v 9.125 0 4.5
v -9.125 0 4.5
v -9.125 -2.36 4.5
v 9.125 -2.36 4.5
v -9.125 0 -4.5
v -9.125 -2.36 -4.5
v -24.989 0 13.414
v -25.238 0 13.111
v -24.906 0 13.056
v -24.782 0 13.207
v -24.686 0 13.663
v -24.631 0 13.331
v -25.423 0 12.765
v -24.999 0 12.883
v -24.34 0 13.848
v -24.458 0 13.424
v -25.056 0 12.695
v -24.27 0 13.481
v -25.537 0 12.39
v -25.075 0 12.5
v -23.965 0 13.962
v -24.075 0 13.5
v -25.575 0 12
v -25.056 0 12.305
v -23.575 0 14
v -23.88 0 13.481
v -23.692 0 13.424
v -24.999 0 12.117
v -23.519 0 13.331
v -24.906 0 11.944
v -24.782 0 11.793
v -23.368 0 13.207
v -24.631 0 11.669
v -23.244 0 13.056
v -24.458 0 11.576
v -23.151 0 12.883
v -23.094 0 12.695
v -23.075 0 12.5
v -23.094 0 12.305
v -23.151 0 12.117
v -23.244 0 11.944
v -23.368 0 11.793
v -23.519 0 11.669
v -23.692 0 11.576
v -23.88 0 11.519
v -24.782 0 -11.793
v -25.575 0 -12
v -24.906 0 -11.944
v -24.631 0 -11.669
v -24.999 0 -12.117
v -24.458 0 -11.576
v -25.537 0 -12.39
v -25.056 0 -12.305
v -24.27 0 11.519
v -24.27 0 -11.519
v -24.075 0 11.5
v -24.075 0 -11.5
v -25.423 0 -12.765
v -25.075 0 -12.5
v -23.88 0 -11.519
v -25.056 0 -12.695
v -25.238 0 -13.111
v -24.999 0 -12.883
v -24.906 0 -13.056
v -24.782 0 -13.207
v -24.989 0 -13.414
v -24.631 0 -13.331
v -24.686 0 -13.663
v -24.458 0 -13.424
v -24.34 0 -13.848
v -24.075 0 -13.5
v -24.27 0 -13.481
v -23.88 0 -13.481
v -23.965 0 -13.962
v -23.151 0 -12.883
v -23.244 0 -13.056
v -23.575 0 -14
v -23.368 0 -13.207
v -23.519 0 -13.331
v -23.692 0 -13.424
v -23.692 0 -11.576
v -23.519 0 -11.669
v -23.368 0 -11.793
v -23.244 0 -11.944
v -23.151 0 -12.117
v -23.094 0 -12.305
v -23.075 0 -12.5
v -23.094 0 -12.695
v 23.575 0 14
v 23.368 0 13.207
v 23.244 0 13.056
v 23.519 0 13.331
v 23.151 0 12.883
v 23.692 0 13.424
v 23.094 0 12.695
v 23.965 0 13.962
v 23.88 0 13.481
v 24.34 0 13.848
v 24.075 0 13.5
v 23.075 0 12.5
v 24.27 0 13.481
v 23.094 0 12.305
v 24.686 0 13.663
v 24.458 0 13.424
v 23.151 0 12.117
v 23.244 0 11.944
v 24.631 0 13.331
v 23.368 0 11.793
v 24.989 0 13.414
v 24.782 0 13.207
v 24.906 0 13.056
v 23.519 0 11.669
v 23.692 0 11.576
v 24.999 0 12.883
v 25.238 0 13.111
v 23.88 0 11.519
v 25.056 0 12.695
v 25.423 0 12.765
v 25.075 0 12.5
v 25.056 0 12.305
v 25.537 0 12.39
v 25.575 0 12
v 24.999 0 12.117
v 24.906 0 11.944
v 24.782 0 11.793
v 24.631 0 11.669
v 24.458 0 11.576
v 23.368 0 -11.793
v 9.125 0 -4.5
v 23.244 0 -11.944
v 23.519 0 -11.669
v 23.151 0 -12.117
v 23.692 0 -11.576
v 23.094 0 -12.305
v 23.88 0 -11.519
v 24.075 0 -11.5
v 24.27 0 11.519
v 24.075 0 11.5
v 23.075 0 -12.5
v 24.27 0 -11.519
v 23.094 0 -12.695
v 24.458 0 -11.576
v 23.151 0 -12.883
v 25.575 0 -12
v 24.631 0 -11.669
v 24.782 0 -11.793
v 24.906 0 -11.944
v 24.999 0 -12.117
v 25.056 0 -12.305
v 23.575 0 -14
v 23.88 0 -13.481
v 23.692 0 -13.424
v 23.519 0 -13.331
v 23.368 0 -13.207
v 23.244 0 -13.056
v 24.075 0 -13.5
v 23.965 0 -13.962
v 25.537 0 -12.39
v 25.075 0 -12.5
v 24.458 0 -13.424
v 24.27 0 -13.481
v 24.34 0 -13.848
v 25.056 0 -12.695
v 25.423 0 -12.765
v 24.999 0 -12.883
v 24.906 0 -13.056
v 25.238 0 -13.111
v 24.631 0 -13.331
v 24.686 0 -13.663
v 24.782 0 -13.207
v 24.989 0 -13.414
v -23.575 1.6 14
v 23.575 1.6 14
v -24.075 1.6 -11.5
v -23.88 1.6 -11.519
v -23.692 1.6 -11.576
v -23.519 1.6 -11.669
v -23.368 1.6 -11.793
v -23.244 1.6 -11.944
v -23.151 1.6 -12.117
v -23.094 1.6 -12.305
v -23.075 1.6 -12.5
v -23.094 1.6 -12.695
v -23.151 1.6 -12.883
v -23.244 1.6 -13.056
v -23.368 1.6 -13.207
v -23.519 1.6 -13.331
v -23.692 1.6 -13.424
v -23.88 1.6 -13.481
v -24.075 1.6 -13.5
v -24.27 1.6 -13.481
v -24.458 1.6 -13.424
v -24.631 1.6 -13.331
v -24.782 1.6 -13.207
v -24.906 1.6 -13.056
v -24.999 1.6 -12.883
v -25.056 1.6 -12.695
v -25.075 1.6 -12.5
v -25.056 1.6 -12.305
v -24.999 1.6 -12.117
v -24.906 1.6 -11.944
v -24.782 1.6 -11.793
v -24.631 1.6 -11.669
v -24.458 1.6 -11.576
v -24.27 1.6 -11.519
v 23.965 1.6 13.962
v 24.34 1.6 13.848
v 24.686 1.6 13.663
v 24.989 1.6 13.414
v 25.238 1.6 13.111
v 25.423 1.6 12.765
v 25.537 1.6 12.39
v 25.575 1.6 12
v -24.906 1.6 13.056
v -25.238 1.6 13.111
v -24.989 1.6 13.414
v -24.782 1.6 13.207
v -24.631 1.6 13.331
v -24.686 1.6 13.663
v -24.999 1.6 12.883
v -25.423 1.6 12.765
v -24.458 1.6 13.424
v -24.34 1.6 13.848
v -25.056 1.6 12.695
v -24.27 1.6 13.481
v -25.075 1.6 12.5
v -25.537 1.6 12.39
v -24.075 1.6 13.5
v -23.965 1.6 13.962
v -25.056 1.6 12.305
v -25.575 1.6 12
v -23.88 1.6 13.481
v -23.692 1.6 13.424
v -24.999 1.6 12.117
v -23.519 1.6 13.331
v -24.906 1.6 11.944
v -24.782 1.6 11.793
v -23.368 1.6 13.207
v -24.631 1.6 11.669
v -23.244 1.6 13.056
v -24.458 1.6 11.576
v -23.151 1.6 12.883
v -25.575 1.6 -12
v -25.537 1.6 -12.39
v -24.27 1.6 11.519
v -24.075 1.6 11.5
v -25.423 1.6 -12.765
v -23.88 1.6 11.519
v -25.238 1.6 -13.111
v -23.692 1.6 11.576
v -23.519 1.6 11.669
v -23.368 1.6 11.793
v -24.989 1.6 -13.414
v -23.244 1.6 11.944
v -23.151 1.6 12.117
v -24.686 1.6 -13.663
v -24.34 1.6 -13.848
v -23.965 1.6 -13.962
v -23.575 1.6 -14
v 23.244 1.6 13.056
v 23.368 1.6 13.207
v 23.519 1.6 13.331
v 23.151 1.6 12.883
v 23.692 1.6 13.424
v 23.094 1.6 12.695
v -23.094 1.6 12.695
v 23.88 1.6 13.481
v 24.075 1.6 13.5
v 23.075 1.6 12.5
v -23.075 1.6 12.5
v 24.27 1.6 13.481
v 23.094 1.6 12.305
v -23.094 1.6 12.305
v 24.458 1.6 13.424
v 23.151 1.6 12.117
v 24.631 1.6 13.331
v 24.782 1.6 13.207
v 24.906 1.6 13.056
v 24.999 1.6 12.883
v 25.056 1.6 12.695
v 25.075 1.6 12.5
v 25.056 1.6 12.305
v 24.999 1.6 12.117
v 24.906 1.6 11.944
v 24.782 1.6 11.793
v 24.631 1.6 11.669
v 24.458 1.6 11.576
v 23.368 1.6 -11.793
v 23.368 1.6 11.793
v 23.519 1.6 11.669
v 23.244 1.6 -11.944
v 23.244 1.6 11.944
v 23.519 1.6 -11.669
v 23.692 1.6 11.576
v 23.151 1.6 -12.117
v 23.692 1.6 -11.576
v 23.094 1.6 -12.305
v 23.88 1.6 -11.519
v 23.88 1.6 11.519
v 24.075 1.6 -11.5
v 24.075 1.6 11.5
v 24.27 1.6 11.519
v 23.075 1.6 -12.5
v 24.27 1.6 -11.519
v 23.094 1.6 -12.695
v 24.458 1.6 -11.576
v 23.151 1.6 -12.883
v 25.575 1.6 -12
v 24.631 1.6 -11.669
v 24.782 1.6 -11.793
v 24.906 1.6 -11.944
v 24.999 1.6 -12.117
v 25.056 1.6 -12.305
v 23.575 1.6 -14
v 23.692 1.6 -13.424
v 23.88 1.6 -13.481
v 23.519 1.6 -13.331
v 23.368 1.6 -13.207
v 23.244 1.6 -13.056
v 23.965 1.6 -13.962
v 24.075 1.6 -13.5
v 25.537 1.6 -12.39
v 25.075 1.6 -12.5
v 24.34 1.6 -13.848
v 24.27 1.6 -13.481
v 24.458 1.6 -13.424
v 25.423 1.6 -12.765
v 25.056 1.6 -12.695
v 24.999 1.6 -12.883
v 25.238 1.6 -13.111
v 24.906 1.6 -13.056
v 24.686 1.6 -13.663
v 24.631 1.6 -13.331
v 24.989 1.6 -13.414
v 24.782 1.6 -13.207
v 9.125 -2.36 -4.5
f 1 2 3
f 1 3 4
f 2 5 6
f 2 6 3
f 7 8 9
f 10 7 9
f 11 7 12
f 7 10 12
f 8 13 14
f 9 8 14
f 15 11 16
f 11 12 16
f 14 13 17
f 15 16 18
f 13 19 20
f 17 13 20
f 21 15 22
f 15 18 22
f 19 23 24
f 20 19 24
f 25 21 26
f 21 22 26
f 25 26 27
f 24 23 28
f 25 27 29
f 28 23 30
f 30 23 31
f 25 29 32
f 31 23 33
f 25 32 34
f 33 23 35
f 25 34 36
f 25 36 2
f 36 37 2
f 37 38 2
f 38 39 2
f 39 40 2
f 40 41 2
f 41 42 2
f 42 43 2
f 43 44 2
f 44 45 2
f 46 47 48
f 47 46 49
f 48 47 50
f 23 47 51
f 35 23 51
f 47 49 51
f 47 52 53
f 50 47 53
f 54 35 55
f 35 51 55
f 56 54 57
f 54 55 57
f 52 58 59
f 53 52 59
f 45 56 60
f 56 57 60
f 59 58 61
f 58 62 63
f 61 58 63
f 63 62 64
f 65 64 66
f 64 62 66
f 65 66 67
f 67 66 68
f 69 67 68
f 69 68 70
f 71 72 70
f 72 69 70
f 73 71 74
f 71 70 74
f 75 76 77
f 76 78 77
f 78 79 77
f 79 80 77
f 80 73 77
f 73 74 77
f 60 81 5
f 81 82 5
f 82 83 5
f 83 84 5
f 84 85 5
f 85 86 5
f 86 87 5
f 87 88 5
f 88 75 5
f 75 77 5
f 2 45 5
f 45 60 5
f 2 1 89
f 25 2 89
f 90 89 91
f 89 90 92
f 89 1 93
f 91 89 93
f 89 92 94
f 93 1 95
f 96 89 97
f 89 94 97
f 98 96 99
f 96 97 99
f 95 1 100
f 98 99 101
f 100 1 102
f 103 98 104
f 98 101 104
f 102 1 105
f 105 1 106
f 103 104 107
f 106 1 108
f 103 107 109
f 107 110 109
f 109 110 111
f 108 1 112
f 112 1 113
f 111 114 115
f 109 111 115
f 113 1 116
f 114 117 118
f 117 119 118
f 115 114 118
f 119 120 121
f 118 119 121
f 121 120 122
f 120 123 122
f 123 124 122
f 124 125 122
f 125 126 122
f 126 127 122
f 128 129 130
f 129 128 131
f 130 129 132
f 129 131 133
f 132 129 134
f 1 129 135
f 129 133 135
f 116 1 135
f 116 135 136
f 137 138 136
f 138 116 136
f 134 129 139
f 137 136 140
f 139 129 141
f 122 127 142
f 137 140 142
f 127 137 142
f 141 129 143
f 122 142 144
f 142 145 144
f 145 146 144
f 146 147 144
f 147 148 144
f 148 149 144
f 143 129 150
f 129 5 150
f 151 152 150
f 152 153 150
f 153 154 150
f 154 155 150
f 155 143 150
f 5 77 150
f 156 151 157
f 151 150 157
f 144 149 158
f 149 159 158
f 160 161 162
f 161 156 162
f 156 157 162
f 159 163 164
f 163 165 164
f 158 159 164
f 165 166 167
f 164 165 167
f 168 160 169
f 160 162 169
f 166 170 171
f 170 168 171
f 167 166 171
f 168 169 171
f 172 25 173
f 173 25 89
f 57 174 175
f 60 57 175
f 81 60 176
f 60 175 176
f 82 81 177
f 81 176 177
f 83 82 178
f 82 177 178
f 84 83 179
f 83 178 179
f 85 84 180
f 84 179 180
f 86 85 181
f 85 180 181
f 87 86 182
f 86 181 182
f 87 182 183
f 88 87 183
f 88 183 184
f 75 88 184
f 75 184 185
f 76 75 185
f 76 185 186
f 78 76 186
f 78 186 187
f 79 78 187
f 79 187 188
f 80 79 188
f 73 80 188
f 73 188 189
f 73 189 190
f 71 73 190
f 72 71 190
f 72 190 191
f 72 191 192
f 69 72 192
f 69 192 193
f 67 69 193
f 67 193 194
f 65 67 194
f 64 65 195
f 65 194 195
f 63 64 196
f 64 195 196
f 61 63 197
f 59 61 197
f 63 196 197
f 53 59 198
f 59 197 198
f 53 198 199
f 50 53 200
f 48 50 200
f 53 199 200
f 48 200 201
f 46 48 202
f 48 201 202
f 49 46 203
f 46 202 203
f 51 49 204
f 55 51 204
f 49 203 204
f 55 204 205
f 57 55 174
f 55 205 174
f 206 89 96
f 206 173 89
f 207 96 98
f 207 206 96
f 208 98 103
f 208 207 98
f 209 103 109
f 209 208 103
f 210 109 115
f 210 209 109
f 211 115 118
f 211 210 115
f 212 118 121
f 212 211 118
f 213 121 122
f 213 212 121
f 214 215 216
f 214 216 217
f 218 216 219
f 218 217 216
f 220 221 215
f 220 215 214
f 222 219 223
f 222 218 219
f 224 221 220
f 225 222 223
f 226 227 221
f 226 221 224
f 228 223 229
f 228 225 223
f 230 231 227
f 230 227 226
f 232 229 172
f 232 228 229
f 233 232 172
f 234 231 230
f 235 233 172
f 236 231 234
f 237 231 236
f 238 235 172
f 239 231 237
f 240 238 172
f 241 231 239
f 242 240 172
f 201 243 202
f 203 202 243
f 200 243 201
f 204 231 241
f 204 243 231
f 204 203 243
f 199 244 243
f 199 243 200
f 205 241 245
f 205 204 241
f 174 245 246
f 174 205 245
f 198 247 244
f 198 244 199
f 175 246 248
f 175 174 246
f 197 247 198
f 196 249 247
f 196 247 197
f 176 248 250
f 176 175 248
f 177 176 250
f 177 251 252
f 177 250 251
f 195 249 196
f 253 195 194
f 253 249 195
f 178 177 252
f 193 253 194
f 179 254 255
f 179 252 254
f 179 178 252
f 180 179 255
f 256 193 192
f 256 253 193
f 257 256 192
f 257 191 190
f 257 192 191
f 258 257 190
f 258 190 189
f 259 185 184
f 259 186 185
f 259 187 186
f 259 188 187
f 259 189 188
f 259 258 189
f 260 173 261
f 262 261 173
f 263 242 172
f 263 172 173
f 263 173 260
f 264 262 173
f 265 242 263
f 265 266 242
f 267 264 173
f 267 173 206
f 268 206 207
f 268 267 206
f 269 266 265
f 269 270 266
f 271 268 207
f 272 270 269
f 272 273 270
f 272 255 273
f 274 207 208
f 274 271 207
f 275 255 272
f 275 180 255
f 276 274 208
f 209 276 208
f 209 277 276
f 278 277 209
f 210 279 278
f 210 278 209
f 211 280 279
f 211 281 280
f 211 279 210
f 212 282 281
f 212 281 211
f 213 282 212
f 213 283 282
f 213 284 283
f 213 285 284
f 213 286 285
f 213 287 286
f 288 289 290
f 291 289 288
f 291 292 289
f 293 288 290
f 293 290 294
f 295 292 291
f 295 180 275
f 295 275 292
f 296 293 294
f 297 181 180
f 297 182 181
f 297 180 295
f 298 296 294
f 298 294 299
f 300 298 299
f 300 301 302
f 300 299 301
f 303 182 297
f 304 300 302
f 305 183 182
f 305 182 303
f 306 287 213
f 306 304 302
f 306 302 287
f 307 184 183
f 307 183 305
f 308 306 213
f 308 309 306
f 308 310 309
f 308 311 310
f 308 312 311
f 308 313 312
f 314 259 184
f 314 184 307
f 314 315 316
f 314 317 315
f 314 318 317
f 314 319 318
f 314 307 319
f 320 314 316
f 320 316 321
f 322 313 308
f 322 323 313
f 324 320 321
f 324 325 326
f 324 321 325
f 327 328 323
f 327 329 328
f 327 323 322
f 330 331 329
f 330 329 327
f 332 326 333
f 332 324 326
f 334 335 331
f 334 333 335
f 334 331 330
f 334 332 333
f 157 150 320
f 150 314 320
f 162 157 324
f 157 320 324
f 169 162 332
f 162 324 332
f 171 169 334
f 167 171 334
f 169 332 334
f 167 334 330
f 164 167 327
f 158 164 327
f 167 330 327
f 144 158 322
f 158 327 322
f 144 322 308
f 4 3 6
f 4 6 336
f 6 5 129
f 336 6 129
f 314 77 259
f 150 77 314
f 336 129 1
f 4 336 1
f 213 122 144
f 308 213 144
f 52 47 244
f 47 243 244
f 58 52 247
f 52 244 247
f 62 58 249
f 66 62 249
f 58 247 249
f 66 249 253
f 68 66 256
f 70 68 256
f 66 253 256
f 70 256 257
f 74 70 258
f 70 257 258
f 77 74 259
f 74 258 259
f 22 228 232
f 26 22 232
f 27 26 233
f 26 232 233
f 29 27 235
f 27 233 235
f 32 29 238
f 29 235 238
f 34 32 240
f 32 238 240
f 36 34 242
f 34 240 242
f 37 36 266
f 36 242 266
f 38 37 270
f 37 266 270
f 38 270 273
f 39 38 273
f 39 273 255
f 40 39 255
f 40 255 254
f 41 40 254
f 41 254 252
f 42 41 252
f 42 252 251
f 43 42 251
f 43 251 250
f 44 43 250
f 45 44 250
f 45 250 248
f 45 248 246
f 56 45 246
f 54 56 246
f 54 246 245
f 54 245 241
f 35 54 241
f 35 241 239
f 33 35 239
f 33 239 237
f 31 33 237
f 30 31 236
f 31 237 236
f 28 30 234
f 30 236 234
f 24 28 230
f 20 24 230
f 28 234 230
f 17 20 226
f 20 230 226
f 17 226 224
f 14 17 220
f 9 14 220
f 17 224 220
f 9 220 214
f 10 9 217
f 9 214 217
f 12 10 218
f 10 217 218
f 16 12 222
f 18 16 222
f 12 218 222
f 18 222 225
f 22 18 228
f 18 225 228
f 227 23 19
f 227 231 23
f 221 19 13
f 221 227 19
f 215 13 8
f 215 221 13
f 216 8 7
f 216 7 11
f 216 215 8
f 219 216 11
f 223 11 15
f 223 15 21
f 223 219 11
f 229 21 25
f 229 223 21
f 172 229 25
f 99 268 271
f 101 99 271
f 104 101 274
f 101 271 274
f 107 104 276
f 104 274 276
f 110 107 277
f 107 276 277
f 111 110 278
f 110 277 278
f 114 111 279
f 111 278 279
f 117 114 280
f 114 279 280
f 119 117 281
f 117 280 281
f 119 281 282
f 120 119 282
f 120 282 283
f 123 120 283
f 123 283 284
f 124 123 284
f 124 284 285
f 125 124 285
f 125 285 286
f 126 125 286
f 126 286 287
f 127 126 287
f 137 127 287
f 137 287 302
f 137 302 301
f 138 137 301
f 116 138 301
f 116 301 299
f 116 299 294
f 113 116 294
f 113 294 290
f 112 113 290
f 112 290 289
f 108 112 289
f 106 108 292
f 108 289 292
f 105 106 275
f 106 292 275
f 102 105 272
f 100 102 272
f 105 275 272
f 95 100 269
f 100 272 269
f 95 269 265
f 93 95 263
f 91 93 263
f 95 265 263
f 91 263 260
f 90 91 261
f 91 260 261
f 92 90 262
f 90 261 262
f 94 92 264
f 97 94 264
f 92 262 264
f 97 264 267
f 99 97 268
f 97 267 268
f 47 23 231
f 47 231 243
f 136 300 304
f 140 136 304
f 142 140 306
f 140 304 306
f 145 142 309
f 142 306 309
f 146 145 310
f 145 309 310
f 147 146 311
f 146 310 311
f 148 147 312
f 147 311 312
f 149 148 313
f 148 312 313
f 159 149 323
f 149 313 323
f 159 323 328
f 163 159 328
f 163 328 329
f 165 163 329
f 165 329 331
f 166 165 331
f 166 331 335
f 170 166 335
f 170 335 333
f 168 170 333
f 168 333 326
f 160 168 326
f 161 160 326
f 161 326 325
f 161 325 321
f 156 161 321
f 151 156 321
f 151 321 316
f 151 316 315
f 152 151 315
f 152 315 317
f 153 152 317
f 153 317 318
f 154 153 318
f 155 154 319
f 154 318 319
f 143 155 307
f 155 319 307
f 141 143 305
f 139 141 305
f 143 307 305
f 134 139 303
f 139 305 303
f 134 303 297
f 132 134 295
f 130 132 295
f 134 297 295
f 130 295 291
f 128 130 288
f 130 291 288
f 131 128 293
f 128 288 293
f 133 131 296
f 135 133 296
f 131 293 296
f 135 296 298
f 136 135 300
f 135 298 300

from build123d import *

# Parameters (mm, degrees)
SKETCH1_W           = 51.15
SKETCH1_H           = 28
BOSS_EXTRUDE1_DEPTH = 1.6
SKETCH2_R           = 1
CUT_EXTRUDE1_DEPTH  = 30.200010702
FILLET1_R           = 2
SKETCH3_W           = 18.25
SKETCH3_H           = 9
BOSS_EXTRUDE2_DEPTH = 2.36


with BuildPart() as part:
    # Sketch1 → Boss-Extrude1 (new body)
    with BuildSketch(Plane(origin=(0, 0, 0), x_dir=(1, 0, 0), z_dir=(0, 1, 0))):
        Rectangle(SKETCH1_W, SKETCH1_H)
    extrude(amount=BOSS_EXTRUDE1_DEPTH)

    # Sketch2 → Cut-Extrude1 (cut, through all)
    with BuildSketch(Plane(origin=(0, 1.6, 0), x_dir=(1, 0, 0), z_dir=(0, 1, 0))):
        with Locations((-24.075, 12.5)):
            Circle(SKETCH2_R)
        with Locations((24.075, 12.5)):
            Circle(SKETCH2_R)
        with Locations((24.075, -12.5)):
            Circle(SKETCH2_R)
        with Locations((-24.075, -12.5)):
            Circle(SKETCH2_R)
    extrude(amount=-CUT_EXTRUDE1_DEPTH, mode=Mode.SUBTRACT)

    # Fillet1
    fillet1_edges = [part.edges().sort_by_distance(p)[0] for p in [
        (25.575, 0.8, -14),
        (25.575, 0.8, 14),
        (-25.575, 0.8, 14),
        (-25.575, 0.8, -14),
    ]]
    fillet(fillet1_edges, radius=FILLET1_R)

    # Sketch3 → Boss-Extrude2 (add)
    with BuildSketch(Plane.XZ):
        Rectangle(SKETCH3_W, SKETCH3_H)
    extrude(amount=BOSS_EXTRUDE2_DEPTH)


solid = part.part
